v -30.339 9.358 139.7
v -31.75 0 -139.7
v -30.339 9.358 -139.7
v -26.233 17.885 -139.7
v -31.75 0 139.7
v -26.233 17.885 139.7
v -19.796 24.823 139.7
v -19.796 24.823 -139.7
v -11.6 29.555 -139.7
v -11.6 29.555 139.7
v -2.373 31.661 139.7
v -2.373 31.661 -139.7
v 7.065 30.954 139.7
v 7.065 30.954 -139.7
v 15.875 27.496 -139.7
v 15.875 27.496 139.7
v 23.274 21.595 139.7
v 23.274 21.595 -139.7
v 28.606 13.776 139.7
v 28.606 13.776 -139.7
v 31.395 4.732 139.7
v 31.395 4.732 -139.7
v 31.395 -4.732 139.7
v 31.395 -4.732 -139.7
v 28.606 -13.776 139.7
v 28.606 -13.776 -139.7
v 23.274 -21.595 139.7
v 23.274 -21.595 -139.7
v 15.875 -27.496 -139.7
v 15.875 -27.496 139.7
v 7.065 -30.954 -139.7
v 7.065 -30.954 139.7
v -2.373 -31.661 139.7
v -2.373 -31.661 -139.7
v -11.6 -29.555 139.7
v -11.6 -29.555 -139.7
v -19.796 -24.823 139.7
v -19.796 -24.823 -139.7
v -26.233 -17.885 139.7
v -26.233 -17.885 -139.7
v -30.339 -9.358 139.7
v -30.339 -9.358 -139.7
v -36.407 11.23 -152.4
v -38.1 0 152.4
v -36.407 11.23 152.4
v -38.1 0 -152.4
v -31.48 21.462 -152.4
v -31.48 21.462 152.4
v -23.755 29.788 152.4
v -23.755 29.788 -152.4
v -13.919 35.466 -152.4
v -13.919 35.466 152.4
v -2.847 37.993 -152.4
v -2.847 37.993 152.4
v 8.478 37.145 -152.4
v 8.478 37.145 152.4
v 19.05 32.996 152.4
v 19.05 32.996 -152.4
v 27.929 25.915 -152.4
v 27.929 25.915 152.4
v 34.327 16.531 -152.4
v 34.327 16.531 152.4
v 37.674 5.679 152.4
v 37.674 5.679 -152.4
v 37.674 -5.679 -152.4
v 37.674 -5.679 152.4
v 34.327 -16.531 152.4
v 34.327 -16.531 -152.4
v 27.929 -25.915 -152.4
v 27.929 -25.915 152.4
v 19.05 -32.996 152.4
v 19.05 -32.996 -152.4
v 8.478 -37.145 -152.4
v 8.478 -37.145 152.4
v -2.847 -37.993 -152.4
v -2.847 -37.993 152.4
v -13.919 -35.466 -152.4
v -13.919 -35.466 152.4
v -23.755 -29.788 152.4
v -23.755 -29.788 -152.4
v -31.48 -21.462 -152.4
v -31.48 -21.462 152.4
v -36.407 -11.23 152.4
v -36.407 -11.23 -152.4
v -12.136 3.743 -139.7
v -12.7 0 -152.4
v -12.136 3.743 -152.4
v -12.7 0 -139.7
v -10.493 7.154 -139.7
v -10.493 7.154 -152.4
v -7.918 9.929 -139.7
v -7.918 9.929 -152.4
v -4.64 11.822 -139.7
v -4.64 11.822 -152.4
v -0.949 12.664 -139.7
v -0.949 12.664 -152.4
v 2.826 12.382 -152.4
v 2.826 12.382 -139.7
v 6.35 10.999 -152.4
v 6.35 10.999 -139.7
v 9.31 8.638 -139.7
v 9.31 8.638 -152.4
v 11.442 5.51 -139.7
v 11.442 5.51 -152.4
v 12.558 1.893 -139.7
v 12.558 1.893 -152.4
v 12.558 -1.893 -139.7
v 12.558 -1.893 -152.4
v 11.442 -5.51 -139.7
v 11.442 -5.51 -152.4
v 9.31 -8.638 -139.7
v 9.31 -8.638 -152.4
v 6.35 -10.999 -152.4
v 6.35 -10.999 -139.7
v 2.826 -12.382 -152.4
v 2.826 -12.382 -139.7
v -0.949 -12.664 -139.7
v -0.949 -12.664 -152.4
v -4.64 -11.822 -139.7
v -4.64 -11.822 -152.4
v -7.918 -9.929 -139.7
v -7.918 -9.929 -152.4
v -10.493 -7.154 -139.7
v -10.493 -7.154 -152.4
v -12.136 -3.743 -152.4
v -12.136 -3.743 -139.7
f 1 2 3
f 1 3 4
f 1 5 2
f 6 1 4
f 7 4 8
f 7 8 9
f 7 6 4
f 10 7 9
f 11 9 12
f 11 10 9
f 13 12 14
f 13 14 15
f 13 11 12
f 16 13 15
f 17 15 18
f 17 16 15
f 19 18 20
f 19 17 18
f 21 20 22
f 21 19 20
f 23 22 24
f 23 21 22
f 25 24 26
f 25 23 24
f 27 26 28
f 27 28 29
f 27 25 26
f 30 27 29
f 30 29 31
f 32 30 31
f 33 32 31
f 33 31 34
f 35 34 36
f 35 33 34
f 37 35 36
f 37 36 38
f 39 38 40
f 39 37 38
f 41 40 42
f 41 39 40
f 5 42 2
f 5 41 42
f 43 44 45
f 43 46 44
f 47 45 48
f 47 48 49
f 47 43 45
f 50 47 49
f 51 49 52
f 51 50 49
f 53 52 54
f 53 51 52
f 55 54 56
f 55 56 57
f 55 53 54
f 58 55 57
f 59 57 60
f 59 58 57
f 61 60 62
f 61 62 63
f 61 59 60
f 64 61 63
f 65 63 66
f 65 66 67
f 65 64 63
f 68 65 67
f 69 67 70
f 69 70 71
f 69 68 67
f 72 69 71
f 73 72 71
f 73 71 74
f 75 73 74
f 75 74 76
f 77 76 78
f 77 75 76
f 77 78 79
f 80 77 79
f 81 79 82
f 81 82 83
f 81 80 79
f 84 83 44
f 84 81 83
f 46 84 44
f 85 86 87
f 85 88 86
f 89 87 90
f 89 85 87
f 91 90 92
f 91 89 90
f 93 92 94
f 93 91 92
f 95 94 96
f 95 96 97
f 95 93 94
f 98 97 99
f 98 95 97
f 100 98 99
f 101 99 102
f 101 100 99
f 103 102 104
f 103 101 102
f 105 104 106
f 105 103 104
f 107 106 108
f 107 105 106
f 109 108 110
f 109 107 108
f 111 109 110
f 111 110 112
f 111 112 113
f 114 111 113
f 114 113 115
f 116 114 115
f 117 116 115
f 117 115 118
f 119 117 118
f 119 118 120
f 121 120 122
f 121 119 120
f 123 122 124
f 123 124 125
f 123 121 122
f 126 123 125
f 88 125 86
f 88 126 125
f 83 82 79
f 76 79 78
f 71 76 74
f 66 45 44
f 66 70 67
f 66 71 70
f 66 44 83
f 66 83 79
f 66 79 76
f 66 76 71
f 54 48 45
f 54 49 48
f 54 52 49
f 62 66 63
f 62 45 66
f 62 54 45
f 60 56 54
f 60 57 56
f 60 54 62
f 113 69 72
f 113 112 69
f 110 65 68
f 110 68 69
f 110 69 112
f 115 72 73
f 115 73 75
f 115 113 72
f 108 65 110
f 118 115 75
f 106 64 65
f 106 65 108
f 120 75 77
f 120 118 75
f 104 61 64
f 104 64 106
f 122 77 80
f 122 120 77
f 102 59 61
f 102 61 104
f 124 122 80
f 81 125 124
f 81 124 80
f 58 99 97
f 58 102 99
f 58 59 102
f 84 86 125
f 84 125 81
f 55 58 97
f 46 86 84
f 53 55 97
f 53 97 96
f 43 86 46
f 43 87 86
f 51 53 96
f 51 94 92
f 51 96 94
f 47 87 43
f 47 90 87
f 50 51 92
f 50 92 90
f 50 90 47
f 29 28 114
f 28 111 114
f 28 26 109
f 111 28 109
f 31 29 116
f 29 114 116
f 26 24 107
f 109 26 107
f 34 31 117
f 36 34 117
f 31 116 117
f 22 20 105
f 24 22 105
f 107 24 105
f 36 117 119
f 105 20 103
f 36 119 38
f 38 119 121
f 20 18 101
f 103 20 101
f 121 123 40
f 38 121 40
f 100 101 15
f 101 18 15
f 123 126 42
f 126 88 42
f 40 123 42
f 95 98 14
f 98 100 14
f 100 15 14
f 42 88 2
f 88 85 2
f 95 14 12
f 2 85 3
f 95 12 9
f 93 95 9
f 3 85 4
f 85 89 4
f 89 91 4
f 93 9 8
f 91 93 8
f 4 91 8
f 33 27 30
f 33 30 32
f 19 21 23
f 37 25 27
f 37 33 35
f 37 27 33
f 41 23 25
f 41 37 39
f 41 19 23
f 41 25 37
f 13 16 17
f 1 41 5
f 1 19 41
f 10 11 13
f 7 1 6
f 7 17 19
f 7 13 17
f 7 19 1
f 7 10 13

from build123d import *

# Parameters (mm, degrees)
F0_W   = 31.75
F0_H   = 12.7
F0_W_2 = 19.05


with BuildPart() as f1:
    # F0 (on Front) → F1 (revolve)
    with BuildSketch(Plane.XZ):
        with Locations((-15.875, 146.05)):
            Rectangle(F0_W, F0_H)
        Polygon((-31.75, 152.4), (-38.1, 152.4), (-38.1, -152.4), (-31.75, -152.4), (-31.75, -139.7), (-31.75, 139.7), align=None)
        with Locations((-22.225, -146.05)):
            Rectangle(F0_W_2, F0_H)
    revolve(axis=Axis((0, 0, 0), (0, 0, -1)))


solid = f1.part
